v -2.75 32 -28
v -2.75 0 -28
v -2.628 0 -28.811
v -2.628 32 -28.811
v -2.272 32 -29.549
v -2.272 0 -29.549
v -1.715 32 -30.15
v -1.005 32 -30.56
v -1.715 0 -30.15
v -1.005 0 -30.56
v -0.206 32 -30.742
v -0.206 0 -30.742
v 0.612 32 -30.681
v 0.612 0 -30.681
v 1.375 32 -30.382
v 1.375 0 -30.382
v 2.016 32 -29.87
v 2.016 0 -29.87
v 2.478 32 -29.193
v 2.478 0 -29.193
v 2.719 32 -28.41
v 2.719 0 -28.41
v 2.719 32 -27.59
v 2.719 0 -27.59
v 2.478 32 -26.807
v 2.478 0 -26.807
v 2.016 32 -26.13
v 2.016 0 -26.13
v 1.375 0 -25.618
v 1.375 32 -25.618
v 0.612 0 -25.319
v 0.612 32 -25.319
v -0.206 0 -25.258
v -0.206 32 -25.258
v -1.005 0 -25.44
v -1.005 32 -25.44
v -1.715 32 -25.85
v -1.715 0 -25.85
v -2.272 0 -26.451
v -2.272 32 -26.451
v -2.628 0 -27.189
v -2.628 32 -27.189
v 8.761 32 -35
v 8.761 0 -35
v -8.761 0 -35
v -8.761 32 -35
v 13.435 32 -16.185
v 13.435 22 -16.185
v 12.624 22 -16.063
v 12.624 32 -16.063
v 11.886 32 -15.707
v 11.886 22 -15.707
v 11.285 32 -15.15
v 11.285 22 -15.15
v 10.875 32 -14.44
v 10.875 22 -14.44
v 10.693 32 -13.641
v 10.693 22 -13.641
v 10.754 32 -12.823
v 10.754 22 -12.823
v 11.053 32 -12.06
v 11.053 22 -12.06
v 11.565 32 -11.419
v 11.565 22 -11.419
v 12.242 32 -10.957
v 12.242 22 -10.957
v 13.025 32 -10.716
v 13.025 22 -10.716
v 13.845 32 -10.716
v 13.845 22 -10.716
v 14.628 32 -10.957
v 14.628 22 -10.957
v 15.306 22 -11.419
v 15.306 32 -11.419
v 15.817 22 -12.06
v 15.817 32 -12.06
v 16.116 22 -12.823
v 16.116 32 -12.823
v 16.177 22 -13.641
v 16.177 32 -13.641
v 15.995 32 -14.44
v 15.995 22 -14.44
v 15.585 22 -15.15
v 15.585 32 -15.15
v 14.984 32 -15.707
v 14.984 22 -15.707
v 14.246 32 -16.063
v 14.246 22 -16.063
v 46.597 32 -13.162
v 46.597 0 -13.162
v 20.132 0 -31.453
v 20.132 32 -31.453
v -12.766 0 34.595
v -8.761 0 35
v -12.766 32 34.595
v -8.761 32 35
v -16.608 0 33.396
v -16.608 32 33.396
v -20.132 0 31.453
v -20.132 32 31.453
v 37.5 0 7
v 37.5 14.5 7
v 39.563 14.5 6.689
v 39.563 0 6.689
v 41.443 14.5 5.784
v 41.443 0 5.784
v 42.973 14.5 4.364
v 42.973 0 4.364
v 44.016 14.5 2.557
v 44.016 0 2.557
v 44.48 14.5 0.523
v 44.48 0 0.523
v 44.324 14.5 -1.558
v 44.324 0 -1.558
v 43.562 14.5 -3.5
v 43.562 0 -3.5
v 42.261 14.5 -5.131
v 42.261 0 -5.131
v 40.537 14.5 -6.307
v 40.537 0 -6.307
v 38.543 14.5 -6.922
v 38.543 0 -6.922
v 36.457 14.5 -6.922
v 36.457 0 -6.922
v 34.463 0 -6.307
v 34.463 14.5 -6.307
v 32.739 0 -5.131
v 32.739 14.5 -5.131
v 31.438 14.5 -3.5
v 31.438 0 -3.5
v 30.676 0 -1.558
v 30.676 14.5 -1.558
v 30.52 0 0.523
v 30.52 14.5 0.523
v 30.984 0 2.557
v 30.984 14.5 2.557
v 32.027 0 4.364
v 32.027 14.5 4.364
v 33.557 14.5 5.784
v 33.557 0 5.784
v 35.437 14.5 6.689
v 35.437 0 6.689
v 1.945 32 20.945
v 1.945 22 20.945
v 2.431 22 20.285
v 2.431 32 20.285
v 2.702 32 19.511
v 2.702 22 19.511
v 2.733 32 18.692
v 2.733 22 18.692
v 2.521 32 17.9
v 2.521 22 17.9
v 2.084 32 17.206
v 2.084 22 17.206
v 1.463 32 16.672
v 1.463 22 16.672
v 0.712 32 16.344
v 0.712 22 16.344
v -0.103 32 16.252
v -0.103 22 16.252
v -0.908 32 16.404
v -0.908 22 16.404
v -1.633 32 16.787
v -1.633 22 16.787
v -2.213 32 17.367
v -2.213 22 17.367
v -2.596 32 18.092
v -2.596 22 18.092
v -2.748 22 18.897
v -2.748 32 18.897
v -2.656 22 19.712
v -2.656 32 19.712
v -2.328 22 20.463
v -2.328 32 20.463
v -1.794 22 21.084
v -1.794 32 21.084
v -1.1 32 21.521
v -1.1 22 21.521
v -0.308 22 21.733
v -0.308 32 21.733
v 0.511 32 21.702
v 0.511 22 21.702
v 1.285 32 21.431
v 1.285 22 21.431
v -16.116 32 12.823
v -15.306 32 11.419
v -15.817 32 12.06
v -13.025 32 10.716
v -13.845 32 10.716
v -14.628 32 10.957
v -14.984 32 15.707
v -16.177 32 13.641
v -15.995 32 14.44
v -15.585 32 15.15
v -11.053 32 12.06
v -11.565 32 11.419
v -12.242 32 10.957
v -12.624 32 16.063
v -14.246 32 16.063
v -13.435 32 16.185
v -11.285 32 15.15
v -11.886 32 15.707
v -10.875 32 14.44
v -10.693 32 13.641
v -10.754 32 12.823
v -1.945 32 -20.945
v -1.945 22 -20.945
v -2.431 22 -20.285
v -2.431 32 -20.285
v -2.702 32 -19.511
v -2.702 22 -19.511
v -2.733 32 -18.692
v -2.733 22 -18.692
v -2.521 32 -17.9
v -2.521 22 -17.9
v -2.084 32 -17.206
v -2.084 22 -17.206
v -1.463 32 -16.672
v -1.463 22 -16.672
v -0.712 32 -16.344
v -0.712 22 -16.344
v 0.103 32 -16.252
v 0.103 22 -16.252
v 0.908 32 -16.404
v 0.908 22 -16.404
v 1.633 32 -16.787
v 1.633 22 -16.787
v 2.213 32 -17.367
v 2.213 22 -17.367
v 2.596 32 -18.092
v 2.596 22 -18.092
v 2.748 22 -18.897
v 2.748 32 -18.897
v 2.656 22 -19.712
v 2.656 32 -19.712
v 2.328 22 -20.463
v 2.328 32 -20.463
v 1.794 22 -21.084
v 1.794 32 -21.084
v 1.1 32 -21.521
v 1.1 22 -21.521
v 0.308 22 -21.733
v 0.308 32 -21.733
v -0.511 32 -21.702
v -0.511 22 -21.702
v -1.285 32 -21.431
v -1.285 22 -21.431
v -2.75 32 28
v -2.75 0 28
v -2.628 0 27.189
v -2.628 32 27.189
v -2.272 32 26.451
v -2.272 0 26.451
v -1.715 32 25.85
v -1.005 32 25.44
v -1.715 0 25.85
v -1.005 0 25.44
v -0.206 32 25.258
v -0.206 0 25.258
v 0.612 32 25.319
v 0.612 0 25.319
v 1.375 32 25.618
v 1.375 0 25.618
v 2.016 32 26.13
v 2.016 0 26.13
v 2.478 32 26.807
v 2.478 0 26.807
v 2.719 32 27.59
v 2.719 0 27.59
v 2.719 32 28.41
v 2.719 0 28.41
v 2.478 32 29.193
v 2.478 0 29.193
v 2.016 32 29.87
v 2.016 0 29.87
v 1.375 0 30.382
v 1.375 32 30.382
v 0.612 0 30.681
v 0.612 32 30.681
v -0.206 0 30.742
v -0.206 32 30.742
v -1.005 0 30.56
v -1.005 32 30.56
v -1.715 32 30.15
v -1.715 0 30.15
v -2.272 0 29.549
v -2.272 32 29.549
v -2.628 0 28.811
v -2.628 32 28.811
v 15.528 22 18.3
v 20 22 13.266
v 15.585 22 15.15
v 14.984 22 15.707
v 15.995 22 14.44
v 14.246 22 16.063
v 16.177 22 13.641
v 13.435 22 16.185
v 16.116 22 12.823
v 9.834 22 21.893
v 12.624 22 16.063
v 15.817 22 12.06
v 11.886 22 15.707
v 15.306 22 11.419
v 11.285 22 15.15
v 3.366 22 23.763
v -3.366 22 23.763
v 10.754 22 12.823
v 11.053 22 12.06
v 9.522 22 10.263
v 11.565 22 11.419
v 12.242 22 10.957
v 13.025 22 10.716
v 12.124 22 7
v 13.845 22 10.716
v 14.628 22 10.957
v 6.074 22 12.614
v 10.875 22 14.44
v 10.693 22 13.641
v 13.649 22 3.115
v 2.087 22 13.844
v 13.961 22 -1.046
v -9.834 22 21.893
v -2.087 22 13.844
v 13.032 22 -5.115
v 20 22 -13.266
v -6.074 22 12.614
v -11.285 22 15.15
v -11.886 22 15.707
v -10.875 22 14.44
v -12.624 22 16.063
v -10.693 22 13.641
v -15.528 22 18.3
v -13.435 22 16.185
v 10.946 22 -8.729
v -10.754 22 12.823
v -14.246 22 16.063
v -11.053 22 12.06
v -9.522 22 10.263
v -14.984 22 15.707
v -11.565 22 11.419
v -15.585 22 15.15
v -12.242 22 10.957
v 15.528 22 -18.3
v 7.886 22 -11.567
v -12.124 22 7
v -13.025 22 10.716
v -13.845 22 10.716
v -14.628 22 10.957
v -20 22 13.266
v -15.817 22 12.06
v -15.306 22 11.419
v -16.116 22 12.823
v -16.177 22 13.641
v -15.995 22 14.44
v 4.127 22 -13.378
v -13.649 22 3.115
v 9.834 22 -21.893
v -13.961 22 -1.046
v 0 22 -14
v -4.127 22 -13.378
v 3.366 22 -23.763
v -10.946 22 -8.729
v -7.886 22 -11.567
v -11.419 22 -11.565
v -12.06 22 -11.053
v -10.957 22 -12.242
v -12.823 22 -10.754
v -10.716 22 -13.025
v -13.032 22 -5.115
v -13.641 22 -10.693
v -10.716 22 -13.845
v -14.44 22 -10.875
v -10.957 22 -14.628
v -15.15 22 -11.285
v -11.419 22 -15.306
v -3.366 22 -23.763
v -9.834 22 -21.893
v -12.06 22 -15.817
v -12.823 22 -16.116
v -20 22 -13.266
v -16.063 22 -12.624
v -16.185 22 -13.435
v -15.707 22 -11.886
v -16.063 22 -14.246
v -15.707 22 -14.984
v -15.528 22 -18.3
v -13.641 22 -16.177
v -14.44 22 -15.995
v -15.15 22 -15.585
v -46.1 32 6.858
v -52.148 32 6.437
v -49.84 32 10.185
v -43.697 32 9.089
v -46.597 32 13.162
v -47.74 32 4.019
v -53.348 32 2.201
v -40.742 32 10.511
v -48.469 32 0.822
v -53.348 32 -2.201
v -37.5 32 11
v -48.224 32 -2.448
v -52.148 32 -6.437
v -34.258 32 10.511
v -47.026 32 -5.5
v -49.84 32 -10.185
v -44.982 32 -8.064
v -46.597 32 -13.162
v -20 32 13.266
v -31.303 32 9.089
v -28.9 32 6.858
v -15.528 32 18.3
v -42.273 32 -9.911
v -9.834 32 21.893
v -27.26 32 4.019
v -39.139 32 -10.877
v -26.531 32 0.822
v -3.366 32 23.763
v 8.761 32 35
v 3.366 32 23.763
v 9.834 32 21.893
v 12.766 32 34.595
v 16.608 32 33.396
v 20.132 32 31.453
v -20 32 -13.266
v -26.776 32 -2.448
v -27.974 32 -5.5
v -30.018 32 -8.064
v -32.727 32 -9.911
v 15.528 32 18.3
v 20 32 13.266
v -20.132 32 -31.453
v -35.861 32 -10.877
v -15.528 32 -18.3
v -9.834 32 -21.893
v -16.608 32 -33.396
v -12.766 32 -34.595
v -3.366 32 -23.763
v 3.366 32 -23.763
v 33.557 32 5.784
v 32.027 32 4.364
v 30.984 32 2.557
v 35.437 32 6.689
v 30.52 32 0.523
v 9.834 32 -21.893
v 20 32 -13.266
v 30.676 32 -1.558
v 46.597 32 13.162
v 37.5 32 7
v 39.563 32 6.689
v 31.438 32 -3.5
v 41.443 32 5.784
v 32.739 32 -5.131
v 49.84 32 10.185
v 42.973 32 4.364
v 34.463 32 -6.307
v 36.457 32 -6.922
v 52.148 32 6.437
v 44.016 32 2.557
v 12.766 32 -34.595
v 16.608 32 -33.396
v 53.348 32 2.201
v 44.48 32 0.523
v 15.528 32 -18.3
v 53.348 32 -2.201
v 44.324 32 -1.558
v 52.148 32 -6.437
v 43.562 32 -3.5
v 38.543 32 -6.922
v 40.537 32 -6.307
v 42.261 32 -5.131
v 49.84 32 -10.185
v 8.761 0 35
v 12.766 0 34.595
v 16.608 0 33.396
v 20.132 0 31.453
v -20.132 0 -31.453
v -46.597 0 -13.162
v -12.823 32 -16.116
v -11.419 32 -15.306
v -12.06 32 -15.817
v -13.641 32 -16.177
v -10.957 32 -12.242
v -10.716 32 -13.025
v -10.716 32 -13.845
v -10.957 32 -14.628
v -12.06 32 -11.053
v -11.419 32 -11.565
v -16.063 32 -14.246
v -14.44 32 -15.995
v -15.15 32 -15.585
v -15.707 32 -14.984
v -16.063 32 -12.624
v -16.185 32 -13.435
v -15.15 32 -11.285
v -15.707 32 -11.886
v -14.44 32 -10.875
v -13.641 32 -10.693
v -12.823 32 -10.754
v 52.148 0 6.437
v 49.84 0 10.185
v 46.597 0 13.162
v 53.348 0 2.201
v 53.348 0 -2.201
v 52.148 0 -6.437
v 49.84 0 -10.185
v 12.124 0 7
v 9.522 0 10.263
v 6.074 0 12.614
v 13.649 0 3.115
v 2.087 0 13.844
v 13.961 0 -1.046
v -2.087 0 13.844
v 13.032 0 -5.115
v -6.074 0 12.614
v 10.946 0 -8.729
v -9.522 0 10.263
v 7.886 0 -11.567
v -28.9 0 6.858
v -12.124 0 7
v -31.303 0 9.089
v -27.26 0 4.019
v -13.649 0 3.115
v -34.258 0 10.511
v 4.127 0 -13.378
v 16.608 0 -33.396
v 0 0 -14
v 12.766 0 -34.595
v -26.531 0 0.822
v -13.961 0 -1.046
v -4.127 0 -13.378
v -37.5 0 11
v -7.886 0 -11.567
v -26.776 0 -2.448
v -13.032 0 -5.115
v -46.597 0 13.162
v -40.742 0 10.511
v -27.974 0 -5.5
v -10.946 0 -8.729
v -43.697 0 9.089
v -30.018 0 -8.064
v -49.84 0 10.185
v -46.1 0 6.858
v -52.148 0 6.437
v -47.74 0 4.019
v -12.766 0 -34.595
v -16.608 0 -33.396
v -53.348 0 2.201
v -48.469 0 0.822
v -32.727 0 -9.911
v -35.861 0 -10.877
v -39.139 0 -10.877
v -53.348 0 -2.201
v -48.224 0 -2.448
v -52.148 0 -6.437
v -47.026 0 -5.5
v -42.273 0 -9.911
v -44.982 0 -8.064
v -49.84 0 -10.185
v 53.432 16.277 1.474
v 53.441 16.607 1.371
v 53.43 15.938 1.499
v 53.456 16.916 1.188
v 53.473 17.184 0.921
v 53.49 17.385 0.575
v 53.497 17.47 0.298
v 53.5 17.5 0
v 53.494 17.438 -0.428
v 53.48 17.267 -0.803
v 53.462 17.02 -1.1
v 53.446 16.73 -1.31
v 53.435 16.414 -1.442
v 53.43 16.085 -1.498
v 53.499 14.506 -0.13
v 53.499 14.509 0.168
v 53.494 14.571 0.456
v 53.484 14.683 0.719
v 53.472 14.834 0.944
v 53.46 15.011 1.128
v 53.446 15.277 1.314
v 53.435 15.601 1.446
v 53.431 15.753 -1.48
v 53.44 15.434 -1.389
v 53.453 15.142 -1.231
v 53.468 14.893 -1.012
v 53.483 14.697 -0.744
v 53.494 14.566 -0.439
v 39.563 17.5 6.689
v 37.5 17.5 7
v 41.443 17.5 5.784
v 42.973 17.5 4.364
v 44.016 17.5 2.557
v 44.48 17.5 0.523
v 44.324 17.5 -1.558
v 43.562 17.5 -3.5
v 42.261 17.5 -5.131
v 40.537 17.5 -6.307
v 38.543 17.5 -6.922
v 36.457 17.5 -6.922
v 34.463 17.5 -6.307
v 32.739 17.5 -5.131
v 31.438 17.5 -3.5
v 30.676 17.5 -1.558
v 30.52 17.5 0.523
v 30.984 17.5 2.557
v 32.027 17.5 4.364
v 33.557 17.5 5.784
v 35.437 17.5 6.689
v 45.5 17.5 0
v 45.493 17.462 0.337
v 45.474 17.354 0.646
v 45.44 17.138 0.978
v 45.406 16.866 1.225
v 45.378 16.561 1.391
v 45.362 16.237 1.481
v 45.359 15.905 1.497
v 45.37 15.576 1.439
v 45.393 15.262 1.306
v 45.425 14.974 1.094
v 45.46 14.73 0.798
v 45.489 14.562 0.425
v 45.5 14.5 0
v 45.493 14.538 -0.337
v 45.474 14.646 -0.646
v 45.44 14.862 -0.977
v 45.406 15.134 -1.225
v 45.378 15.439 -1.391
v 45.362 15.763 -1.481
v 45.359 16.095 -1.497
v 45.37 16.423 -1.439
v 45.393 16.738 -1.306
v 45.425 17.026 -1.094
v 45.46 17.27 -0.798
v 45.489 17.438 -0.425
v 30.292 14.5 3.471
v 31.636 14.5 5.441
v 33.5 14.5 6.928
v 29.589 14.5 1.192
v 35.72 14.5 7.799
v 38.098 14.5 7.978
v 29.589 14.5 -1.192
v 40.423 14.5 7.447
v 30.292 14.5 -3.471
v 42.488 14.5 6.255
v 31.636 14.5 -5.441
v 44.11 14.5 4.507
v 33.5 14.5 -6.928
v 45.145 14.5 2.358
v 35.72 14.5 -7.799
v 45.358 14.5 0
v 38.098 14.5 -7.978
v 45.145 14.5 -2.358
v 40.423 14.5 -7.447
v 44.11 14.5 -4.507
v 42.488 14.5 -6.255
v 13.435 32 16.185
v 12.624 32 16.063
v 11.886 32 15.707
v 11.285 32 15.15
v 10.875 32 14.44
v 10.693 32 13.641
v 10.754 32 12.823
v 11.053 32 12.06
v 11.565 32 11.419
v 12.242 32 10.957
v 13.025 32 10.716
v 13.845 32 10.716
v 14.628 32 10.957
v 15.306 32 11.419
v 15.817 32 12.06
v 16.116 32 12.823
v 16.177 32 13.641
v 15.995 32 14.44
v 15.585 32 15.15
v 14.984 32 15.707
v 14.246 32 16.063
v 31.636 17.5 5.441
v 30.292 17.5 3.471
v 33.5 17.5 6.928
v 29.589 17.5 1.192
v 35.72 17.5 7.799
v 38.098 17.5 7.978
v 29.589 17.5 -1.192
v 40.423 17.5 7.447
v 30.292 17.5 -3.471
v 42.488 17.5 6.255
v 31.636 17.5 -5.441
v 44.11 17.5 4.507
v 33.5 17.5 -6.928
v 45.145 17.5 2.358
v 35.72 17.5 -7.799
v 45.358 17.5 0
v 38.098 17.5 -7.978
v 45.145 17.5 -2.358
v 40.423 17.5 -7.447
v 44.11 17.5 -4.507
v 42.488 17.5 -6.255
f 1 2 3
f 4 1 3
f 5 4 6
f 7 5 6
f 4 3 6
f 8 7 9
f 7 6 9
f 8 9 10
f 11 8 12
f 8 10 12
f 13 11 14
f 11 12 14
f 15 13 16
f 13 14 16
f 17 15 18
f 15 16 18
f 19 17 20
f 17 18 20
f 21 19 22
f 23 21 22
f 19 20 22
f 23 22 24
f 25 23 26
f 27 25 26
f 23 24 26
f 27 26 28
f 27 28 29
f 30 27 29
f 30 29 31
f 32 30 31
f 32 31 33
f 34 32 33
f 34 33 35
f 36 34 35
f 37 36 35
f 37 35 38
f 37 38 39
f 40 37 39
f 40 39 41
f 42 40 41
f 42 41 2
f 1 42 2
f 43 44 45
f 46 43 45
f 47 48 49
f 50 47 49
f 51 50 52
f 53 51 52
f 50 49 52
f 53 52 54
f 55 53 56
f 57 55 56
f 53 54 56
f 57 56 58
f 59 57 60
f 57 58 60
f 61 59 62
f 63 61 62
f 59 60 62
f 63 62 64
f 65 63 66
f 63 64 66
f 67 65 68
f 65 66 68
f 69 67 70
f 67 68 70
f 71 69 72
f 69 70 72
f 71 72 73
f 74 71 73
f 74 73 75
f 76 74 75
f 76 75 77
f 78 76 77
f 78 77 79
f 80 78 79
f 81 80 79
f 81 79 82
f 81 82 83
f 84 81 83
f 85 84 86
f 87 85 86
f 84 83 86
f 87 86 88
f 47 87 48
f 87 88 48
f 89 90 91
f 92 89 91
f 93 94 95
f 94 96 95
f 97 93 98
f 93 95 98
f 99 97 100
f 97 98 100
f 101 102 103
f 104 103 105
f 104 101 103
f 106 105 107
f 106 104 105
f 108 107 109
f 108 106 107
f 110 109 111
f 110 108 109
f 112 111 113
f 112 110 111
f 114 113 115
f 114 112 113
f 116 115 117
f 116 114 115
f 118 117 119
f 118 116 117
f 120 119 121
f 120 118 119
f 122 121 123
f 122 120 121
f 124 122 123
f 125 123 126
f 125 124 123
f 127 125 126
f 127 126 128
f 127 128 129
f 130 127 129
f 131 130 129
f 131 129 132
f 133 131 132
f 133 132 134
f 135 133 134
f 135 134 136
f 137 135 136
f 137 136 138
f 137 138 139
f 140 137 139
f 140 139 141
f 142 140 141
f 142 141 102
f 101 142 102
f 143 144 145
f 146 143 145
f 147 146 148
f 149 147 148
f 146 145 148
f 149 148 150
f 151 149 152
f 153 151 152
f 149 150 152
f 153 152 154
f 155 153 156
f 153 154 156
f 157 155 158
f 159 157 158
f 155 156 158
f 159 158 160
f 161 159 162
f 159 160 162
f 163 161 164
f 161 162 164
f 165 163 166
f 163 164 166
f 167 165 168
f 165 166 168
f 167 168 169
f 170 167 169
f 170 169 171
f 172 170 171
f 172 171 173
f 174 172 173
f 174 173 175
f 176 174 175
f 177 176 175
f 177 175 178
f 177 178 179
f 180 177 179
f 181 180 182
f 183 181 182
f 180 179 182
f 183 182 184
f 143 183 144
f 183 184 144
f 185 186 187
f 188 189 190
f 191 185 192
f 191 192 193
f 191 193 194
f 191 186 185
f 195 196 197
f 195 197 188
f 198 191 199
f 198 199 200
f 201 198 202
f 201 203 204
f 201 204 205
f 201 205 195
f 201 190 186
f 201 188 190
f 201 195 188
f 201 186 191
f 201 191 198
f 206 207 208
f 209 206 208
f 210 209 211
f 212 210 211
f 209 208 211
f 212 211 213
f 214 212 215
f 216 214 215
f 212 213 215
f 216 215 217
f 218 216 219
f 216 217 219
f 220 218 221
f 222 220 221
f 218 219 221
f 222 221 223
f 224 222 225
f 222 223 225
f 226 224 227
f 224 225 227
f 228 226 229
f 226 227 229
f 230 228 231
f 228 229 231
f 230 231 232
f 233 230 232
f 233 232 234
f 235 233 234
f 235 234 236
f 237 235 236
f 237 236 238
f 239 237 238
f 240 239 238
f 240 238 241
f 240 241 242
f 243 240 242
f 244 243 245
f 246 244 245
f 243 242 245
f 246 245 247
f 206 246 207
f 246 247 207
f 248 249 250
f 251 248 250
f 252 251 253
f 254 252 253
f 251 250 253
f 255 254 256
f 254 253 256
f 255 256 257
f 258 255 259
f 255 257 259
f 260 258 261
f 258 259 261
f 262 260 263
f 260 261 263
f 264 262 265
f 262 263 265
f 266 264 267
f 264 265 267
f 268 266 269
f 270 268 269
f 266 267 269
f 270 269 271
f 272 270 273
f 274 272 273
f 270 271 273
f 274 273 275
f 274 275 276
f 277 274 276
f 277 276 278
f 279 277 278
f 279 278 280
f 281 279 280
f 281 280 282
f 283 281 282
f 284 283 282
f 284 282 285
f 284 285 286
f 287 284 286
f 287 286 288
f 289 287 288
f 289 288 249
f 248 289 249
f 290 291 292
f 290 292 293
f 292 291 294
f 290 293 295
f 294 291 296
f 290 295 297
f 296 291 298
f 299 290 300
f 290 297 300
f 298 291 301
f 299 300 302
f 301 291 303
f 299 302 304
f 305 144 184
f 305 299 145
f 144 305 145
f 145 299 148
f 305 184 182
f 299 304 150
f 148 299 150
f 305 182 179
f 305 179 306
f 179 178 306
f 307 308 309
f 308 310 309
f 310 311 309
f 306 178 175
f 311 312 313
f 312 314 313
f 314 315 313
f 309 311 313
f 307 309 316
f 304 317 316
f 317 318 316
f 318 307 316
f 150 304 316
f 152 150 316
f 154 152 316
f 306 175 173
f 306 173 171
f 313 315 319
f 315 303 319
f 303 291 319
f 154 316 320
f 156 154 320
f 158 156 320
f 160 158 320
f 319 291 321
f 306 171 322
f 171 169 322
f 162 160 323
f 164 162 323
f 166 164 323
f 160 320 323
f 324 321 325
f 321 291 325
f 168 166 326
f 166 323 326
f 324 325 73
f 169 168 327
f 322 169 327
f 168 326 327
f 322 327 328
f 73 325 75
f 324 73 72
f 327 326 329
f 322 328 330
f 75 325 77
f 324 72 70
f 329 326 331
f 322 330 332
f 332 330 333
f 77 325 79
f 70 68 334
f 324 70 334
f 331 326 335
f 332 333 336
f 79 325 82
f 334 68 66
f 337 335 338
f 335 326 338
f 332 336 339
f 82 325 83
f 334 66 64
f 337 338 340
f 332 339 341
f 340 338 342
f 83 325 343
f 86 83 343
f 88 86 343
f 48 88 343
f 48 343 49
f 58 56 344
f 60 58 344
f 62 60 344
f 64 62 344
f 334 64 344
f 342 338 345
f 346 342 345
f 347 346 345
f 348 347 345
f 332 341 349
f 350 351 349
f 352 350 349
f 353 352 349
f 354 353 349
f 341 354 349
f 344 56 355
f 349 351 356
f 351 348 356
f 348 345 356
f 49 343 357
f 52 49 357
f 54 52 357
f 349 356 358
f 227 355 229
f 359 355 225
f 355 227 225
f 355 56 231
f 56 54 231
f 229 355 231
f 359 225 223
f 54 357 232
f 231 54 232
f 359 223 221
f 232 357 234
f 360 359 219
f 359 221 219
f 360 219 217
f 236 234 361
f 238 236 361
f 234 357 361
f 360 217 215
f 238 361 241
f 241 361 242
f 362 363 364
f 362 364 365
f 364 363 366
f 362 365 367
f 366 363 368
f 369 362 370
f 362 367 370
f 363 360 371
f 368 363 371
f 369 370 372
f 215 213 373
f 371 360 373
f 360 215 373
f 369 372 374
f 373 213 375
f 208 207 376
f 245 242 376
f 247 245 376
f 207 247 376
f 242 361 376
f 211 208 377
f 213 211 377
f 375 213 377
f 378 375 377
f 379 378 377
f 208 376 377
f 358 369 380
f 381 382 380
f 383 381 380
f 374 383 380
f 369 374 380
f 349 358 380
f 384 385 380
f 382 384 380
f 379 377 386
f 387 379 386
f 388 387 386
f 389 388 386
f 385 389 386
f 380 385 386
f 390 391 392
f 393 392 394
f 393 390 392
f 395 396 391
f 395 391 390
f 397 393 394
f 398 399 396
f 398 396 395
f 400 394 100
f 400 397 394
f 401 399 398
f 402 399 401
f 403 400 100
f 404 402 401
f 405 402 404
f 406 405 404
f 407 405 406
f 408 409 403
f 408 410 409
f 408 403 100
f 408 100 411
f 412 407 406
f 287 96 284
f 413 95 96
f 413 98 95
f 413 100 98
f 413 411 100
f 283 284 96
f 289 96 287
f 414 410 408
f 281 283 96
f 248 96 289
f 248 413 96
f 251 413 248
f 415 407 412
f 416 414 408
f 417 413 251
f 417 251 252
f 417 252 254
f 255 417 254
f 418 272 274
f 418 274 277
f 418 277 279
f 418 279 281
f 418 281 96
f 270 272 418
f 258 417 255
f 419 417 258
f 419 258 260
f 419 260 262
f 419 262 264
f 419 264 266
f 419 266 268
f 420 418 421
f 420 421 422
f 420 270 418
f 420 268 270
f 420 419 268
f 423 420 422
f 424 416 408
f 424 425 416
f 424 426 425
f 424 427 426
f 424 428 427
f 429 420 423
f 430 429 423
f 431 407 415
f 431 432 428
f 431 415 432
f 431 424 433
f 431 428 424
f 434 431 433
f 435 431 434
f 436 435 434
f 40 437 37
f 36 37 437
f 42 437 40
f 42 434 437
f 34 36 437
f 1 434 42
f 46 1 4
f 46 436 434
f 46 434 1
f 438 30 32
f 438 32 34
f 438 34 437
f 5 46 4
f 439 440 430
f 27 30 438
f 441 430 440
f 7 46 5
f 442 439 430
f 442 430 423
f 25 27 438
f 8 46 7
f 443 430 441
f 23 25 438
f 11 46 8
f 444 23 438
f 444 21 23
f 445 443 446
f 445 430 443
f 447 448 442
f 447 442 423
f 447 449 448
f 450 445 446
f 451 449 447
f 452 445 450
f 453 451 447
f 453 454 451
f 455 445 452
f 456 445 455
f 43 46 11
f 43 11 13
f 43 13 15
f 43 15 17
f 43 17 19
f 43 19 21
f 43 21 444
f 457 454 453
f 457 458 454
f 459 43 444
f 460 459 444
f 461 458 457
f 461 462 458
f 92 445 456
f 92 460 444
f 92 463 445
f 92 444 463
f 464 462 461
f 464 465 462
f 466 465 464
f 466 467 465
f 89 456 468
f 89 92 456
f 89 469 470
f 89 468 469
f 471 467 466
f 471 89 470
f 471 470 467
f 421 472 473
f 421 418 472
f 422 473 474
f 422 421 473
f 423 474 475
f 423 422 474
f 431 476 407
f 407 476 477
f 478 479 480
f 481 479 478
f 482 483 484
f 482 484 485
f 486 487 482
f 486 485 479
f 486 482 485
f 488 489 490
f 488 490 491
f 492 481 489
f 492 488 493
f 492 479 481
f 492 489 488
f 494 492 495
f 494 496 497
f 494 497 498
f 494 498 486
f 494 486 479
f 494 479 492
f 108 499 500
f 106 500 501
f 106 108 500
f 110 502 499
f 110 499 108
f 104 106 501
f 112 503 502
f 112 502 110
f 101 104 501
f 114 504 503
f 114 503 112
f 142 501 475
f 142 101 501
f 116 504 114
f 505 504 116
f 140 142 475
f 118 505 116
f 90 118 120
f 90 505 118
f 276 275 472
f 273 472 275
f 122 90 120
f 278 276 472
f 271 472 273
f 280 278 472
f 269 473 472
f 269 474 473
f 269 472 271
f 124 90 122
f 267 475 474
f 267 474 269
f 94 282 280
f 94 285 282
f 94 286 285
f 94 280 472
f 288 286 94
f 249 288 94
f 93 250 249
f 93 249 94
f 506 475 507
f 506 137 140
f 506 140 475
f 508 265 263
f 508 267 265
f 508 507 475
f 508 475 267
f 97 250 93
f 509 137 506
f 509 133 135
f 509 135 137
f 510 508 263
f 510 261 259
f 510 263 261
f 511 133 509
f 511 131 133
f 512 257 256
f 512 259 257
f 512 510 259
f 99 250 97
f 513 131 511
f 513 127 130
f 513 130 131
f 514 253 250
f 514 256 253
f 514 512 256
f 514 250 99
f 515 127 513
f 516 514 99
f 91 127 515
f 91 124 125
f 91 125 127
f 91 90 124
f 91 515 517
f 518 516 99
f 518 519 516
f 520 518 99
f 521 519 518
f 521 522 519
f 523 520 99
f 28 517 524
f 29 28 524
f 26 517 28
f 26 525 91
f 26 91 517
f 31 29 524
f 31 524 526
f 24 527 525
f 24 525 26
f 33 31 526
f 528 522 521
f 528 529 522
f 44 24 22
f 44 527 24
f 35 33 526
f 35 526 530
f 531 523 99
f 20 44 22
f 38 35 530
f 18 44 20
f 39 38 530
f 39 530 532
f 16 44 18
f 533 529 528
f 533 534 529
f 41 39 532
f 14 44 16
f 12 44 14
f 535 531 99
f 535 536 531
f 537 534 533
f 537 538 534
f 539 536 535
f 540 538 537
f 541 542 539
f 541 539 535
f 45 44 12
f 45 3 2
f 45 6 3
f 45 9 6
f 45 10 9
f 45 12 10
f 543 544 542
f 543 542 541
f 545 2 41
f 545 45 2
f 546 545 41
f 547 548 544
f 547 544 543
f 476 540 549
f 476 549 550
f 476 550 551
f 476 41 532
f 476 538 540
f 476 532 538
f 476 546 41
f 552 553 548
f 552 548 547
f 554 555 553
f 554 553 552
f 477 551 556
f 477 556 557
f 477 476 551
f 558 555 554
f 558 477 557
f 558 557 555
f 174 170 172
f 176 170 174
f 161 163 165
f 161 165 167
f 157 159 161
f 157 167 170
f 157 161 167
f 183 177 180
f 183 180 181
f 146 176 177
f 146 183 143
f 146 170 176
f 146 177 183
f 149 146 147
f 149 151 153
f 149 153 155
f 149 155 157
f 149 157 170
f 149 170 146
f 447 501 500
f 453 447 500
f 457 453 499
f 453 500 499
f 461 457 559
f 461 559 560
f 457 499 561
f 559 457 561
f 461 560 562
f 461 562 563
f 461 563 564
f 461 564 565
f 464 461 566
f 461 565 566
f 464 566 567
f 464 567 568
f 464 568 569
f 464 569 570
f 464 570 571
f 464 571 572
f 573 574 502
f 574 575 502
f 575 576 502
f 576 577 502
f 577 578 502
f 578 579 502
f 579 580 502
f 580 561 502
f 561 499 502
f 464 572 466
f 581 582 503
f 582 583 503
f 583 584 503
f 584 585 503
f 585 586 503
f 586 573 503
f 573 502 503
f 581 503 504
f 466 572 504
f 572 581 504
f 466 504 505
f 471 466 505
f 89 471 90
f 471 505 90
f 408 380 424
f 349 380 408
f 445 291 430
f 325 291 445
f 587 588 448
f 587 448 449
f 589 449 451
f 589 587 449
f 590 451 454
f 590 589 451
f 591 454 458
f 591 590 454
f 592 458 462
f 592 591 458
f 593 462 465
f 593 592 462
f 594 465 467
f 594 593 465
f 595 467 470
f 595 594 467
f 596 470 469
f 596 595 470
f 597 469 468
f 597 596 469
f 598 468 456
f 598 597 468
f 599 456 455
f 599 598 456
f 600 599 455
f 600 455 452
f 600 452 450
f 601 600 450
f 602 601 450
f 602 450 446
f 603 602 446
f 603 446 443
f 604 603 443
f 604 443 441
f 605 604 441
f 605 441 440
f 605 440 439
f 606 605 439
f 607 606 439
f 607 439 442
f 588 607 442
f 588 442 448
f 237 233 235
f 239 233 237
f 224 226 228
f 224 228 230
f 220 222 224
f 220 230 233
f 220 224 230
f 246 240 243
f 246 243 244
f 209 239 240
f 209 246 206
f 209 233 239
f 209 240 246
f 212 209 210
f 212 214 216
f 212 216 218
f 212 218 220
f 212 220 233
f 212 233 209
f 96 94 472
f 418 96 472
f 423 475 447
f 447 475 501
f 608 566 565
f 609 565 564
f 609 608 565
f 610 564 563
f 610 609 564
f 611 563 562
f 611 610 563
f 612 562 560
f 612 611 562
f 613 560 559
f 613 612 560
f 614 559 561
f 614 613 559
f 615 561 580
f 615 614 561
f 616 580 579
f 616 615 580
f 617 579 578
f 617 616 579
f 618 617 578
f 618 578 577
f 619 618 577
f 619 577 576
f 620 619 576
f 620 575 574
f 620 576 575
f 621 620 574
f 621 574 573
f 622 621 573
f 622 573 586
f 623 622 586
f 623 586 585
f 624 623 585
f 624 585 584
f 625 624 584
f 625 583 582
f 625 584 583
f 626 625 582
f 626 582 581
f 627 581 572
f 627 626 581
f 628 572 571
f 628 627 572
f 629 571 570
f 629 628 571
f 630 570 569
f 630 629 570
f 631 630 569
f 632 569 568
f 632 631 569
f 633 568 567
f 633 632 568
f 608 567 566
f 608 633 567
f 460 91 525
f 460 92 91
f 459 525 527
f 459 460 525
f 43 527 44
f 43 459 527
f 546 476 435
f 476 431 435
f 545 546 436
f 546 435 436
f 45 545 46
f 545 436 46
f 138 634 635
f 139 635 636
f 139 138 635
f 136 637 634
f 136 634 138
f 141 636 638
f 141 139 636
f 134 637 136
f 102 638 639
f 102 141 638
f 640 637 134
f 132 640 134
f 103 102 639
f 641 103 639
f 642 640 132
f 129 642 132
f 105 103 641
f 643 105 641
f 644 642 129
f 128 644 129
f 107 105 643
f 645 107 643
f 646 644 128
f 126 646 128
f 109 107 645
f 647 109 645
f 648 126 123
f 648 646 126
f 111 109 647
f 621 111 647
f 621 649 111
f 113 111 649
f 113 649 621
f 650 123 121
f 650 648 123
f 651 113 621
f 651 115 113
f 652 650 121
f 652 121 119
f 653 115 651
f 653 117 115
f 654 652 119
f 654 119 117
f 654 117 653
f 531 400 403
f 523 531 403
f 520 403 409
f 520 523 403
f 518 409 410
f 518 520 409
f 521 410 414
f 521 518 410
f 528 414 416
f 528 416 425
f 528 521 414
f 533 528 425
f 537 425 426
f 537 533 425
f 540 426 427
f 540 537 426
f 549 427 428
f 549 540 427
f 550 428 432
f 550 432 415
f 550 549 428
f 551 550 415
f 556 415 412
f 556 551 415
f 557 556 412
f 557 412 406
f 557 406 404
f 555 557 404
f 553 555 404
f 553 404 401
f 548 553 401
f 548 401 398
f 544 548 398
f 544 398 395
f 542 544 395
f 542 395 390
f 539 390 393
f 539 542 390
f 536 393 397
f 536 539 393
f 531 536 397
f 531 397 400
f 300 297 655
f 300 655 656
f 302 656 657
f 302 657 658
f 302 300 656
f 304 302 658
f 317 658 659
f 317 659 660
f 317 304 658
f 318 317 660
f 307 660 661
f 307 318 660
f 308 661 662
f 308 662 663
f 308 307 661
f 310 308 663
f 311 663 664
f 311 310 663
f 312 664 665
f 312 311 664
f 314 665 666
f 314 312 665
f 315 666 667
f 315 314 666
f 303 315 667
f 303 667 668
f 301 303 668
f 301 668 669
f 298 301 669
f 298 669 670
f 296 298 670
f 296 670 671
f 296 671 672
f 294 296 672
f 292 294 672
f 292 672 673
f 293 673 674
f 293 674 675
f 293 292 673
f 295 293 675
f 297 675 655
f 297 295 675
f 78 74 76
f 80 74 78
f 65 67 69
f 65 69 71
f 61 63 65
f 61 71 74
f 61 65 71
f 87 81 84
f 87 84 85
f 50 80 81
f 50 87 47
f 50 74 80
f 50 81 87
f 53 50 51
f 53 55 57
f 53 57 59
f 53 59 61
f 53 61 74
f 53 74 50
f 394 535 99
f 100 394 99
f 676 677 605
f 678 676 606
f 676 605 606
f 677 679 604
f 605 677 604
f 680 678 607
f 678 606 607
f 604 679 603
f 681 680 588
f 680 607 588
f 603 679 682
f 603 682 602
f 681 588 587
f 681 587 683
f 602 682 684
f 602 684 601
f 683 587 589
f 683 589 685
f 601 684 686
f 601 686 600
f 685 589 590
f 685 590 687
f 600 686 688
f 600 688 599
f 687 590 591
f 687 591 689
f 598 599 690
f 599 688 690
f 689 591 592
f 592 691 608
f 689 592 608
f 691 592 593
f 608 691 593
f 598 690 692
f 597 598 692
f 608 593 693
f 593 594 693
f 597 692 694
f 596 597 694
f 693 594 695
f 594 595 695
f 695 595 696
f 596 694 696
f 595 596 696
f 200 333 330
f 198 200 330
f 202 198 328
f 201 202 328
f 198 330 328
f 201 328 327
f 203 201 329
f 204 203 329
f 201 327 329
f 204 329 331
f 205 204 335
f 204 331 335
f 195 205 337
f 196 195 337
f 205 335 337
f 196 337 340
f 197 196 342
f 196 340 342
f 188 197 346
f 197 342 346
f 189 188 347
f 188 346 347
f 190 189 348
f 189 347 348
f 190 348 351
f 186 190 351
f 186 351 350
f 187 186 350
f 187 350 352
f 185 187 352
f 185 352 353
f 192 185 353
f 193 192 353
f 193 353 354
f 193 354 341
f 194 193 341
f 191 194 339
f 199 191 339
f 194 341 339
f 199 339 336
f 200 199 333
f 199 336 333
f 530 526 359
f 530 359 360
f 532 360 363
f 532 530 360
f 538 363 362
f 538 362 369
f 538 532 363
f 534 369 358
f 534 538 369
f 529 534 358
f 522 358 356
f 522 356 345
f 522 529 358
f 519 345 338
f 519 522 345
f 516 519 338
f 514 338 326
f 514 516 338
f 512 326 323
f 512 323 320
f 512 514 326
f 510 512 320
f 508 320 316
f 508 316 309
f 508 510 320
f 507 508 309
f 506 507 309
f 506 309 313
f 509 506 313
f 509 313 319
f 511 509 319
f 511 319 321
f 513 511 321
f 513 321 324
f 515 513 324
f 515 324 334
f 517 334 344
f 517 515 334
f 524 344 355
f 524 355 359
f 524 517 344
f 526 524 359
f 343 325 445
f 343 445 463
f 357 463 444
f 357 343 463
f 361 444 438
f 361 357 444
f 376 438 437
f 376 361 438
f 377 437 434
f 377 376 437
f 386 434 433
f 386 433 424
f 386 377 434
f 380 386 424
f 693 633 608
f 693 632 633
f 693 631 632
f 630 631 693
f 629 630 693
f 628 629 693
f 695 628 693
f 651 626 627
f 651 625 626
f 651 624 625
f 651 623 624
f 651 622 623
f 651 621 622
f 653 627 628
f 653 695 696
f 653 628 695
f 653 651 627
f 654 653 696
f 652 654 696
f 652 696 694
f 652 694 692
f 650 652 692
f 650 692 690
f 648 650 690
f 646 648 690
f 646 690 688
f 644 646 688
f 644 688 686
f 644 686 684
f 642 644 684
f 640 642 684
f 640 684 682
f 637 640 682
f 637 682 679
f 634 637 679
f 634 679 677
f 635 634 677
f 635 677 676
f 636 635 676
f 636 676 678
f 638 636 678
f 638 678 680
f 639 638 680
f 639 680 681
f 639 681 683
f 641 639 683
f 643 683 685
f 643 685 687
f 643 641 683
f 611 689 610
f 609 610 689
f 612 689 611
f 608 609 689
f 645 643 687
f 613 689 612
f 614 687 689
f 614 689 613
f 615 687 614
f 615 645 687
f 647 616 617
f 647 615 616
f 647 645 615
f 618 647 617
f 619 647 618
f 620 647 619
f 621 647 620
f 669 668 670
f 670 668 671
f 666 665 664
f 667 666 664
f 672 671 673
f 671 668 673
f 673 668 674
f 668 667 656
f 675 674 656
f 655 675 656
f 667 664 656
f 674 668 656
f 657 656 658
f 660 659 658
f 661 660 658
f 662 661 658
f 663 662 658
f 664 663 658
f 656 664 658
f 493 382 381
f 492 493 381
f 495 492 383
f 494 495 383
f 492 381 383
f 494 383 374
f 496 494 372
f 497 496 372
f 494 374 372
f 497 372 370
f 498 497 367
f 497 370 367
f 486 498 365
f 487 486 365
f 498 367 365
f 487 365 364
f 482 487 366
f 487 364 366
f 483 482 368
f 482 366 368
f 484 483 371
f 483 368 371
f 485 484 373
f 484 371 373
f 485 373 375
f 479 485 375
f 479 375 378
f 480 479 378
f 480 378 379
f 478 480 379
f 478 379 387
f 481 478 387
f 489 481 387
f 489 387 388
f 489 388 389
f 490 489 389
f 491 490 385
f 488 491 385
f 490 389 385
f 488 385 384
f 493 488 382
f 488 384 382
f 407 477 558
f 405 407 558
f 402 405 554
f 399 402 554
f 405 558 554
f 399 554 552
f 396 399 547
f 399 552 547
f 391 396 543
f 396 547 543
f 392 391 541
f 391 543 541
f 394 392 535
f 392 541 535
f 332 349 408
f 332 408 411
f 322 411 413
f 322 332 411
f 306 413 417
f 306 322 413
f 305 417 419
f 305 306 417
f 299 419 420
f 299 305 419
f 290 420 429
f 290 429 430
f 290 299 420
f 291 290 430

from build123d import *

# Parameters (mm, degrees)
SKETCH1_R               = 11
SKETCH1_R_2             = 7
EXTRUDE2_DEPTH          = 32
SKETCH_R                = 14
EXTRUDE3_DEPTH          = 22
FILLET1_R               = 20
SKETCH5_R               = 2.75
EXTRUDE5_DEPTH          = 10
CIRPATTERN1_COUNT       = 3
CIRPATTERN1_ANGLE       = 90
MIRROR1_COPY_1_SKETCH_R = 2.75
MIRROR1_COPY_1_DEPTH    = 10
MIRROR1_COPY_2_SKETCH_R = 2.75
MIRROR1_COPY_2_DEPTH    = 10
EXTRUDE10_START         = 14.5
EXTRUDE10_OUTLINE_R     = 8
EXTRUDE10_OUTLINE_R_2   = 7
EXTRUDE10_DEPTH         = 3
EXTRUDE11_START         = 45.358117006
EXTRUDE11_OUTLINE_R     = 1.5
EXTRUDE11_DEPTH         = 8.141882994
M5_CLEARANCE_HOLE1_D    = 5.5


# Read off the part's stored shape, not the designer's step: Extrude10, Extrude11
with BuildPart() as part:
    # Sketch1 → Extrude2 (new body)
    with BuildSketch(Plane(origin=(0, 0, 0), x_dir=(1, 0, 0), z_dir=(0, 1, 0))):
        with BuildLine():
            Line((-15, -35), (15, -35))
            Line((15, -35), (46.596913018, -13.162301226))
            ThreePointArc((46.596913018, -13.162301226), (53.5, 0), (46.596913018, 13.162301226))
            Line((46.596913018, 13.162301226), (15, 35))
            Line((15, 35), (-15, 35))
            Line((-15, 35), (-46.596913018, 13.162301226))
            ThreePointArc((-46.596913018, 13.162301226), (-53.5, 0), (-46.596913018, -13.162301226))
            Line((-46.596913018, -13.162301226), (-15, -35))
        make_face()
        with Locations(Location((-37.5, 0, 0), (0, 0, 270))):
            Circle(SKETCH1_R, mode=Mode.SUBTRACT)
        with Locations(Location((37.5, 0, 0), (0, 0, 270))):
            Circle(SKETCH1_R_2, mode=Mode.SUBTRACT)
        with BuildLine():
            Line((-20, 13.266499161), (-20, -13.266499161))
            ThreePointArc((-20, -13.266499161), (0, -24), (20, -13.266499161))
            Line((20, -13.266499161), (20, 13.266499161))
            ThreePointArc((20, 13.266499161), (0, 24), (-20, 13.266499161))
        make_face(mode=Mode.SUBTRACT)
    extrude(amount=EXTRUDE2_DEPTH)

    # Sketch → Extrude3 (add)
    with BuildSketch(Plane(origin=(0, 0, 0), x_dir=(1, 0, 0), z_dir=(0, 1, 0))):
        with BuildLine():
            Line((20, 13.266499161), (20, -13.266499161))
            ThreePointArc((20, -13.266499161), (0, -24), (-20, -13.266499161))
            Line((-20, -13.266499161), (-20, 13.266499161))
            ThreePointArc((-20, 13.266499161), (0, 24), (20, 13.266499161))
        make_face()
        with Locations(Location((0, 0, 0), (0, 0, 90))):
            Circle(SKETCH_R, mode=Mode.SUBTRACT)
    extrude(amount=EXTRUDE3_DEPTH)

    # Fillet1
    fillet1_edges = [part.edges().sort_by_distance(p)[0] for p in [
        (15, 16, 35),
        (-15, 16, 35),
        (-15, 16, -35),
        (15, 16, -35),
    ]]
    fillet(fillet1_edges, radius=FILLET1_R)

    # Sketch5 → Extrude5 (add)
    with BuildSketch(Plane(origin=(0, 22, 0), x_dir=(1, 0, 0), z_dir=(0, 1, 0))):
        with Locations(Location((13.435028843, 13.435028843, 0), (0, 0, 90))):
            Circle(SKETCH5_R)
    extrude5 = extrude(amount=EXTRUDE5_DEPTH)

    # CirPattern1: Extrude5 ×3 about axis
    cirpattern1_axis = Axis((0, 0, 0), (0, 1, 0))
    for i in range(1, CIRPATTERN1_COUNT):
        add(extrude5.rotate(cirpattern1_axis, i * CIRPATTERN1_ANGLE / (CIRPATTERN1_COUNT - 1)))

    # Mirror1: Extrude5 across plane
    add(extrude5.mirror(Plane.XY))

    # Mirror1 copy 1 sketch → Mirror1 copy 1 (add)
    with BuildSketch(Plane(origin=(0, 22, 0), x_dir=(0.7071067811865467, 0, 0.7071067811865483), z_dir=(0, 1, 0))):
        with Locations((13.435028843, -13.435028843)):
            Circle(MIRROR1_COPY_1_SKETCH_R)
    extrude(amount=MIRROR1_COPY_1_DEPTH)

    # Mirror1 copy 2 sketch → Mirror1 copy 2 (add)
    with BuildSketch(Plane.ZX.offset(22)):
        with Locations((13.435028843, -13.435028843)):
            Circle(MIRROR1_COPY_2_SKETCH_R)
    extrude(amount=MIRROR1_COPY_2_DEPTH)

    # Extrude10 outline → Extrude10 (cut)
    with BuildSketch(Plane(origin=(0, 0, 0), x_dir=(1, 0, 0), z_dir=(0, 1, 0)).offset(EXTRUDE10_START)):
        with Locations((37.5, 0)):
            Circle(EXTRUDE10_OUTLINE_R)
        with Locations((37.5, 0)):
            Circle(EXTRUDE10_OUTLINE_R_2, mode=Mode.SUBTRACT)
    extrude(amount=EXTRUDE10_DEPTH, mode=Mode.SUBTRACT)

    # Extrude11 outline → Extrude11 (cut)
    with BuildSketch(Plane.YZ.offset(EXTRUDE11_START)):
        with Locations((16, 0)):
            Circle(EXTRUDE11_OUTLINE_R)
    extrude(amount=EXTRUDE11_DEPTH, mode=Mode.SUBTRACT)

    # M5 Clearance Hole1 (through all)
    with Locations(Plane(origin=(0, 32, 0), x_dir=(1, 0, 0), z_dir=(0, 1, 0))):
        with Locations((0, 28), (0, -28)):
            Hole(M5_CLEARANCE_HOLE1_D / 2)


solid = part.part
